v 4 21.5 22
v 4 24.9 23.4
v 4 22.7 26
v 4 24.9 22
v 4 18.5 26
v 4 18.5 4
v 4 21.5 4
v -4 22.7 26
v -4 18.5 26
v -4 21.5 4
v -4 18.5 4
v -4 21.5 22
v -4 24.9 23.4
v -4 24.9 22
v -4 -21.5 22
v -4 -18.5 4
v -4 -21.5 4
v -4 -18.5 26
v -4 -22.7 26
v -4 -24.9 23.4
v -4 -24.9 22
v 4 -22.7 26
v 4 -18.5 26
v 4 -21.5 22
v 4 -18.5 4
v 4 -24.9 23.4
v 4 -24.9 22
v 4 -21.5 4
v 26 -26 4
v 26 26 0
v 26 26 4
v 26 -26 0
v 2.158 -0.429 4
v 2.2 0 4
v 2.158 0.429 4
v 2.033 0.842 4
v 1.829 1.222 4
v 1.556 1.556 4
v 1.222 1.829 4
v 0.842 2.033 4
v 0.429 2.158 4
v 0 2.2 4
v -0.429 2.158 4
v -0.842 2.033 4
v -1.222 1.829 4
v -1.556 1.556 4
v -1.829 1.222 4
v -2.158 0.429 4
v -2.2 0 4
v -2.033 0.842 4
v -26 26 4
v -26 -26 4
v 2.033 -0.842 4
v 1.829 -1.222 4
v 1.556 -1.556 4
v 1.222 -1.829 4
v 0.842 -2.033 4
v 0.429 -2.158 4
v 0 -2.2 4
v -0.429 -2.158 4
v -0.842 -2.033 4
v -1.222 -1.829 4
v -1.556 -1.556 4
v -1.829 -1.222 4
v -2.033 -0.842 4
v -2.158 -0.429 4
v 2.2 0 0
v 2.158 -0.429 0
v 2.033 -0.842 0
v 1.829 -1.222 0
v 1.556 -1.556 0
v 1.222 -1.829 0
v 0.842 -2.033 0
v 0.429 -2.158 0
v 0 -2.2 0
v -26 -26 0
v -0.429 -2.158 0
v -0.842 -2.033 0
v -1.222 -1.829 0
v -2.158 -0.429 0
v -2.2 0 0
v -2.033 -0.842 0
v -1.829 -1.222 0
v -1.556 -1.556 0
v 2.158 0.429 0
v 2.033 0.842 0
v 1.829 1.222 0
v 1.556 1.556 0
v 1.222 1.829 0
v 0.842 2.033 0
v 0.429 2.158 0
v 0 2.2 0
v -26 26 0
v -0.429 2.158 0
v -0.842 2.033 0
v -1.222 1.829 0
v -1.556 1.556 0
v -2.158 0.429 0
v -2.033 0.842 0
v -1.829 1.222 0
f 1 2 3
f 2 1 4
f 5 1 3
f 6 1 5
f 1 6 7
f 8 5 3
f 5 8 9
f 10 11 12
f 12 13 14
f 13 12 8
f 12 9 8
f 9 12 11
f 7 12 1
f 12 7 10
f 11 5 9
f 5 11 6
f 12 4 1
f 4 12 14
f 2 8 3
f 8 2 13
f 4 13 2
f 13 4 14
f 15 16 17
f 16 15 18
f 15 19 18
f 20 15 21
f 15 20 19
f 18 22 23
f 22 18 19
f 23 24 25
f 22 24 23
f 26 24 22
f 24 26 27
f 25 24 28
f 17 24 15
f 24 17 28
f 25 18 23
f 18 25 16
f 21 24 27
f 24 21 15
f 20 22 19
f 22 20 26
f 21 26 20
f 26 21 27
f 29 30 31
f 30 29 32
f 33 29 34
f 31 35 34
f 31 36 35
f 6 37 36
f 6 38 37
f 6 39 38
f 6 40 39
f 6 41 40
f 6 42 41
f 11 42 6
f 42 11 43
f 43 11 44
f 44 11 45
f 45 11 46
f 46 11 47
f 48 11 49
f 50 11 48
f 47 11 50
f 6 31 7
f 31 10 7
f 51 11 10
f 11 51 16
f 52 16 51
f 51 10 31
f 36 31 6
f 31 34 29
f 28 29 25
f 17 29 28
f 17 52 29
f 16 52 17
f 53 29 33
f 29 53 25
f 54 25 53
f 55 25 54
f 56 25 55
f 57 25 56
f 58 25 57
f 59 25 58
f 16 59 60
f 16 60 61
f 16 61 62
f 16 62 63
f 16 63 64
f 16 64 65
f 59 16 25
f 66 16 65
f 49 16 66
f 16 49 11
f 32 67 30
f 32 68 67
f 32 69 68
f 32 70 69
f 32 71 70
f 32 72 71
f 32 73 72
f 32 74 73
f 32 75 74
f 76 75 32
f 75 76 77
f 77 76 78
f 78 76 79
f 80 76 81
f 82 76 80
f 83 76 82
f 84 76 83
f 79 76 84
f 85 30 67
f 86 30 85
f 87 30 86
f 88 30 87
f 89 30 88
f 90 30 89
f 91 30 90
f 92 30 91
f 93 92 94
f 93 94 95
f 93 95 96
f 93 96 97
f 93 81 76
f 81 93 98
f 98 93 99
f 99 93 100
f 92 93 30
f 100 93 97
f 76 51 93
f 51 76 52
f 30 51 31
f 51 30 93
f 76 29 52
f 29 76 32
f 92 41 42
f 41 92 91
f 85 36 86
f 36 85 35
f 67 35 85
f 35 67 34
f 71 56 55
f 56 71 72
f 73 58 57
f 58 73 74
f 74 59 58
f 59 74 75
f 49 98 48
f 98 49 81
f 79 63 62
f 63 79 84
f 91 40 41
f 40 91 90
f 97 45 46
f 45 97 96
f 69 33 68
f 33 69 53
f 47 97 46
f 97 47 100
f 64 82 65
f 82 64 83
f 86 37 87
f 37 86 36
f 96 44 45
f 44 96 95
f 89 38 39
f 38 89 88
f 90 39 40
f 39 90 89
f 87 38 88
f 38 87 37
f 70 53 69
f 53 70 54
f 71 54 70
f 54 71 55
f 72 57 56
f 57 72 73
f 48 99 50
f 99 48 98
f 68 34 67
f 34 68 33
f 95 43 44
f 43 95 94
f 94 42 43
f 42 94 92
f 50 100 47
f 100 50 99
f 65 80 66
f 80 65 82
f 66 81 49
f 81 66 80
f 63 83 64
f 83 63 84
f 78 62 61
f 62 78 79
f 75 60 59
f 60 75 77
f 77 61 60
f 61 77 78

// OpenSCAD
$fn = 32;

// ----------------------------------------------------------------------
// Snap-fit latch: 2 arms, 22 mm tall, 3.6 mm undercut hooks
// ----------------------------------------------------------------------

// --- parameters (mm) ---
base_d = 52;              // base plate depth
base_h = 4;               // base plate thickness
span = 40;                // distance between opposite arms
arm_t = 3;                // arm thickness
arm_d = 8;                // arm width
height = 22;              // free arm length
head_len = 3.6;           // hook reach
head_h = 4;               // hook height
lead = 1.4;               // lead-in ramp thickness
bore_d = 4.4;             // base fixing bore
top_z = 26;               // height of the arm tips above the base

arms = 2;

difference() {
  union() {
    /* base plate, centred on the arm ring */
    translate([-26, -26, 0]) cube([base_d, base_d, base_h]);
    for (a = [0 : 360 / arms : 359]) rotate([0, 0, a]) {
    /* arm, sunk 0.5 mm into the base */
    translate([-arm_d / 2, span / 2 - arm_t / 2, base_h - 0.5]) cube([arm_d, arm_t, height + 0.5]);
    /* hook: a convex hull of a tall inner block and a thin outer lip
       gives a flat undercut below and a lead-in ramp on top */
    hull() {
      translate([-arm_d / 2, span / 2 + arm_t / 2 - 0.6, top_z - head_h]) cube([arm_d, lead + 0.4, head_h]);
      translate([-arm_d / 2, span / 2 + arm_t / 2 - 0.2, top_z - head_h]) cube([arm_d, head_len, lead]);
    }
    }
  }
  translate([0, 0, -2.5]) cylinder(h = base_h + 5, d = bore_d);
}
